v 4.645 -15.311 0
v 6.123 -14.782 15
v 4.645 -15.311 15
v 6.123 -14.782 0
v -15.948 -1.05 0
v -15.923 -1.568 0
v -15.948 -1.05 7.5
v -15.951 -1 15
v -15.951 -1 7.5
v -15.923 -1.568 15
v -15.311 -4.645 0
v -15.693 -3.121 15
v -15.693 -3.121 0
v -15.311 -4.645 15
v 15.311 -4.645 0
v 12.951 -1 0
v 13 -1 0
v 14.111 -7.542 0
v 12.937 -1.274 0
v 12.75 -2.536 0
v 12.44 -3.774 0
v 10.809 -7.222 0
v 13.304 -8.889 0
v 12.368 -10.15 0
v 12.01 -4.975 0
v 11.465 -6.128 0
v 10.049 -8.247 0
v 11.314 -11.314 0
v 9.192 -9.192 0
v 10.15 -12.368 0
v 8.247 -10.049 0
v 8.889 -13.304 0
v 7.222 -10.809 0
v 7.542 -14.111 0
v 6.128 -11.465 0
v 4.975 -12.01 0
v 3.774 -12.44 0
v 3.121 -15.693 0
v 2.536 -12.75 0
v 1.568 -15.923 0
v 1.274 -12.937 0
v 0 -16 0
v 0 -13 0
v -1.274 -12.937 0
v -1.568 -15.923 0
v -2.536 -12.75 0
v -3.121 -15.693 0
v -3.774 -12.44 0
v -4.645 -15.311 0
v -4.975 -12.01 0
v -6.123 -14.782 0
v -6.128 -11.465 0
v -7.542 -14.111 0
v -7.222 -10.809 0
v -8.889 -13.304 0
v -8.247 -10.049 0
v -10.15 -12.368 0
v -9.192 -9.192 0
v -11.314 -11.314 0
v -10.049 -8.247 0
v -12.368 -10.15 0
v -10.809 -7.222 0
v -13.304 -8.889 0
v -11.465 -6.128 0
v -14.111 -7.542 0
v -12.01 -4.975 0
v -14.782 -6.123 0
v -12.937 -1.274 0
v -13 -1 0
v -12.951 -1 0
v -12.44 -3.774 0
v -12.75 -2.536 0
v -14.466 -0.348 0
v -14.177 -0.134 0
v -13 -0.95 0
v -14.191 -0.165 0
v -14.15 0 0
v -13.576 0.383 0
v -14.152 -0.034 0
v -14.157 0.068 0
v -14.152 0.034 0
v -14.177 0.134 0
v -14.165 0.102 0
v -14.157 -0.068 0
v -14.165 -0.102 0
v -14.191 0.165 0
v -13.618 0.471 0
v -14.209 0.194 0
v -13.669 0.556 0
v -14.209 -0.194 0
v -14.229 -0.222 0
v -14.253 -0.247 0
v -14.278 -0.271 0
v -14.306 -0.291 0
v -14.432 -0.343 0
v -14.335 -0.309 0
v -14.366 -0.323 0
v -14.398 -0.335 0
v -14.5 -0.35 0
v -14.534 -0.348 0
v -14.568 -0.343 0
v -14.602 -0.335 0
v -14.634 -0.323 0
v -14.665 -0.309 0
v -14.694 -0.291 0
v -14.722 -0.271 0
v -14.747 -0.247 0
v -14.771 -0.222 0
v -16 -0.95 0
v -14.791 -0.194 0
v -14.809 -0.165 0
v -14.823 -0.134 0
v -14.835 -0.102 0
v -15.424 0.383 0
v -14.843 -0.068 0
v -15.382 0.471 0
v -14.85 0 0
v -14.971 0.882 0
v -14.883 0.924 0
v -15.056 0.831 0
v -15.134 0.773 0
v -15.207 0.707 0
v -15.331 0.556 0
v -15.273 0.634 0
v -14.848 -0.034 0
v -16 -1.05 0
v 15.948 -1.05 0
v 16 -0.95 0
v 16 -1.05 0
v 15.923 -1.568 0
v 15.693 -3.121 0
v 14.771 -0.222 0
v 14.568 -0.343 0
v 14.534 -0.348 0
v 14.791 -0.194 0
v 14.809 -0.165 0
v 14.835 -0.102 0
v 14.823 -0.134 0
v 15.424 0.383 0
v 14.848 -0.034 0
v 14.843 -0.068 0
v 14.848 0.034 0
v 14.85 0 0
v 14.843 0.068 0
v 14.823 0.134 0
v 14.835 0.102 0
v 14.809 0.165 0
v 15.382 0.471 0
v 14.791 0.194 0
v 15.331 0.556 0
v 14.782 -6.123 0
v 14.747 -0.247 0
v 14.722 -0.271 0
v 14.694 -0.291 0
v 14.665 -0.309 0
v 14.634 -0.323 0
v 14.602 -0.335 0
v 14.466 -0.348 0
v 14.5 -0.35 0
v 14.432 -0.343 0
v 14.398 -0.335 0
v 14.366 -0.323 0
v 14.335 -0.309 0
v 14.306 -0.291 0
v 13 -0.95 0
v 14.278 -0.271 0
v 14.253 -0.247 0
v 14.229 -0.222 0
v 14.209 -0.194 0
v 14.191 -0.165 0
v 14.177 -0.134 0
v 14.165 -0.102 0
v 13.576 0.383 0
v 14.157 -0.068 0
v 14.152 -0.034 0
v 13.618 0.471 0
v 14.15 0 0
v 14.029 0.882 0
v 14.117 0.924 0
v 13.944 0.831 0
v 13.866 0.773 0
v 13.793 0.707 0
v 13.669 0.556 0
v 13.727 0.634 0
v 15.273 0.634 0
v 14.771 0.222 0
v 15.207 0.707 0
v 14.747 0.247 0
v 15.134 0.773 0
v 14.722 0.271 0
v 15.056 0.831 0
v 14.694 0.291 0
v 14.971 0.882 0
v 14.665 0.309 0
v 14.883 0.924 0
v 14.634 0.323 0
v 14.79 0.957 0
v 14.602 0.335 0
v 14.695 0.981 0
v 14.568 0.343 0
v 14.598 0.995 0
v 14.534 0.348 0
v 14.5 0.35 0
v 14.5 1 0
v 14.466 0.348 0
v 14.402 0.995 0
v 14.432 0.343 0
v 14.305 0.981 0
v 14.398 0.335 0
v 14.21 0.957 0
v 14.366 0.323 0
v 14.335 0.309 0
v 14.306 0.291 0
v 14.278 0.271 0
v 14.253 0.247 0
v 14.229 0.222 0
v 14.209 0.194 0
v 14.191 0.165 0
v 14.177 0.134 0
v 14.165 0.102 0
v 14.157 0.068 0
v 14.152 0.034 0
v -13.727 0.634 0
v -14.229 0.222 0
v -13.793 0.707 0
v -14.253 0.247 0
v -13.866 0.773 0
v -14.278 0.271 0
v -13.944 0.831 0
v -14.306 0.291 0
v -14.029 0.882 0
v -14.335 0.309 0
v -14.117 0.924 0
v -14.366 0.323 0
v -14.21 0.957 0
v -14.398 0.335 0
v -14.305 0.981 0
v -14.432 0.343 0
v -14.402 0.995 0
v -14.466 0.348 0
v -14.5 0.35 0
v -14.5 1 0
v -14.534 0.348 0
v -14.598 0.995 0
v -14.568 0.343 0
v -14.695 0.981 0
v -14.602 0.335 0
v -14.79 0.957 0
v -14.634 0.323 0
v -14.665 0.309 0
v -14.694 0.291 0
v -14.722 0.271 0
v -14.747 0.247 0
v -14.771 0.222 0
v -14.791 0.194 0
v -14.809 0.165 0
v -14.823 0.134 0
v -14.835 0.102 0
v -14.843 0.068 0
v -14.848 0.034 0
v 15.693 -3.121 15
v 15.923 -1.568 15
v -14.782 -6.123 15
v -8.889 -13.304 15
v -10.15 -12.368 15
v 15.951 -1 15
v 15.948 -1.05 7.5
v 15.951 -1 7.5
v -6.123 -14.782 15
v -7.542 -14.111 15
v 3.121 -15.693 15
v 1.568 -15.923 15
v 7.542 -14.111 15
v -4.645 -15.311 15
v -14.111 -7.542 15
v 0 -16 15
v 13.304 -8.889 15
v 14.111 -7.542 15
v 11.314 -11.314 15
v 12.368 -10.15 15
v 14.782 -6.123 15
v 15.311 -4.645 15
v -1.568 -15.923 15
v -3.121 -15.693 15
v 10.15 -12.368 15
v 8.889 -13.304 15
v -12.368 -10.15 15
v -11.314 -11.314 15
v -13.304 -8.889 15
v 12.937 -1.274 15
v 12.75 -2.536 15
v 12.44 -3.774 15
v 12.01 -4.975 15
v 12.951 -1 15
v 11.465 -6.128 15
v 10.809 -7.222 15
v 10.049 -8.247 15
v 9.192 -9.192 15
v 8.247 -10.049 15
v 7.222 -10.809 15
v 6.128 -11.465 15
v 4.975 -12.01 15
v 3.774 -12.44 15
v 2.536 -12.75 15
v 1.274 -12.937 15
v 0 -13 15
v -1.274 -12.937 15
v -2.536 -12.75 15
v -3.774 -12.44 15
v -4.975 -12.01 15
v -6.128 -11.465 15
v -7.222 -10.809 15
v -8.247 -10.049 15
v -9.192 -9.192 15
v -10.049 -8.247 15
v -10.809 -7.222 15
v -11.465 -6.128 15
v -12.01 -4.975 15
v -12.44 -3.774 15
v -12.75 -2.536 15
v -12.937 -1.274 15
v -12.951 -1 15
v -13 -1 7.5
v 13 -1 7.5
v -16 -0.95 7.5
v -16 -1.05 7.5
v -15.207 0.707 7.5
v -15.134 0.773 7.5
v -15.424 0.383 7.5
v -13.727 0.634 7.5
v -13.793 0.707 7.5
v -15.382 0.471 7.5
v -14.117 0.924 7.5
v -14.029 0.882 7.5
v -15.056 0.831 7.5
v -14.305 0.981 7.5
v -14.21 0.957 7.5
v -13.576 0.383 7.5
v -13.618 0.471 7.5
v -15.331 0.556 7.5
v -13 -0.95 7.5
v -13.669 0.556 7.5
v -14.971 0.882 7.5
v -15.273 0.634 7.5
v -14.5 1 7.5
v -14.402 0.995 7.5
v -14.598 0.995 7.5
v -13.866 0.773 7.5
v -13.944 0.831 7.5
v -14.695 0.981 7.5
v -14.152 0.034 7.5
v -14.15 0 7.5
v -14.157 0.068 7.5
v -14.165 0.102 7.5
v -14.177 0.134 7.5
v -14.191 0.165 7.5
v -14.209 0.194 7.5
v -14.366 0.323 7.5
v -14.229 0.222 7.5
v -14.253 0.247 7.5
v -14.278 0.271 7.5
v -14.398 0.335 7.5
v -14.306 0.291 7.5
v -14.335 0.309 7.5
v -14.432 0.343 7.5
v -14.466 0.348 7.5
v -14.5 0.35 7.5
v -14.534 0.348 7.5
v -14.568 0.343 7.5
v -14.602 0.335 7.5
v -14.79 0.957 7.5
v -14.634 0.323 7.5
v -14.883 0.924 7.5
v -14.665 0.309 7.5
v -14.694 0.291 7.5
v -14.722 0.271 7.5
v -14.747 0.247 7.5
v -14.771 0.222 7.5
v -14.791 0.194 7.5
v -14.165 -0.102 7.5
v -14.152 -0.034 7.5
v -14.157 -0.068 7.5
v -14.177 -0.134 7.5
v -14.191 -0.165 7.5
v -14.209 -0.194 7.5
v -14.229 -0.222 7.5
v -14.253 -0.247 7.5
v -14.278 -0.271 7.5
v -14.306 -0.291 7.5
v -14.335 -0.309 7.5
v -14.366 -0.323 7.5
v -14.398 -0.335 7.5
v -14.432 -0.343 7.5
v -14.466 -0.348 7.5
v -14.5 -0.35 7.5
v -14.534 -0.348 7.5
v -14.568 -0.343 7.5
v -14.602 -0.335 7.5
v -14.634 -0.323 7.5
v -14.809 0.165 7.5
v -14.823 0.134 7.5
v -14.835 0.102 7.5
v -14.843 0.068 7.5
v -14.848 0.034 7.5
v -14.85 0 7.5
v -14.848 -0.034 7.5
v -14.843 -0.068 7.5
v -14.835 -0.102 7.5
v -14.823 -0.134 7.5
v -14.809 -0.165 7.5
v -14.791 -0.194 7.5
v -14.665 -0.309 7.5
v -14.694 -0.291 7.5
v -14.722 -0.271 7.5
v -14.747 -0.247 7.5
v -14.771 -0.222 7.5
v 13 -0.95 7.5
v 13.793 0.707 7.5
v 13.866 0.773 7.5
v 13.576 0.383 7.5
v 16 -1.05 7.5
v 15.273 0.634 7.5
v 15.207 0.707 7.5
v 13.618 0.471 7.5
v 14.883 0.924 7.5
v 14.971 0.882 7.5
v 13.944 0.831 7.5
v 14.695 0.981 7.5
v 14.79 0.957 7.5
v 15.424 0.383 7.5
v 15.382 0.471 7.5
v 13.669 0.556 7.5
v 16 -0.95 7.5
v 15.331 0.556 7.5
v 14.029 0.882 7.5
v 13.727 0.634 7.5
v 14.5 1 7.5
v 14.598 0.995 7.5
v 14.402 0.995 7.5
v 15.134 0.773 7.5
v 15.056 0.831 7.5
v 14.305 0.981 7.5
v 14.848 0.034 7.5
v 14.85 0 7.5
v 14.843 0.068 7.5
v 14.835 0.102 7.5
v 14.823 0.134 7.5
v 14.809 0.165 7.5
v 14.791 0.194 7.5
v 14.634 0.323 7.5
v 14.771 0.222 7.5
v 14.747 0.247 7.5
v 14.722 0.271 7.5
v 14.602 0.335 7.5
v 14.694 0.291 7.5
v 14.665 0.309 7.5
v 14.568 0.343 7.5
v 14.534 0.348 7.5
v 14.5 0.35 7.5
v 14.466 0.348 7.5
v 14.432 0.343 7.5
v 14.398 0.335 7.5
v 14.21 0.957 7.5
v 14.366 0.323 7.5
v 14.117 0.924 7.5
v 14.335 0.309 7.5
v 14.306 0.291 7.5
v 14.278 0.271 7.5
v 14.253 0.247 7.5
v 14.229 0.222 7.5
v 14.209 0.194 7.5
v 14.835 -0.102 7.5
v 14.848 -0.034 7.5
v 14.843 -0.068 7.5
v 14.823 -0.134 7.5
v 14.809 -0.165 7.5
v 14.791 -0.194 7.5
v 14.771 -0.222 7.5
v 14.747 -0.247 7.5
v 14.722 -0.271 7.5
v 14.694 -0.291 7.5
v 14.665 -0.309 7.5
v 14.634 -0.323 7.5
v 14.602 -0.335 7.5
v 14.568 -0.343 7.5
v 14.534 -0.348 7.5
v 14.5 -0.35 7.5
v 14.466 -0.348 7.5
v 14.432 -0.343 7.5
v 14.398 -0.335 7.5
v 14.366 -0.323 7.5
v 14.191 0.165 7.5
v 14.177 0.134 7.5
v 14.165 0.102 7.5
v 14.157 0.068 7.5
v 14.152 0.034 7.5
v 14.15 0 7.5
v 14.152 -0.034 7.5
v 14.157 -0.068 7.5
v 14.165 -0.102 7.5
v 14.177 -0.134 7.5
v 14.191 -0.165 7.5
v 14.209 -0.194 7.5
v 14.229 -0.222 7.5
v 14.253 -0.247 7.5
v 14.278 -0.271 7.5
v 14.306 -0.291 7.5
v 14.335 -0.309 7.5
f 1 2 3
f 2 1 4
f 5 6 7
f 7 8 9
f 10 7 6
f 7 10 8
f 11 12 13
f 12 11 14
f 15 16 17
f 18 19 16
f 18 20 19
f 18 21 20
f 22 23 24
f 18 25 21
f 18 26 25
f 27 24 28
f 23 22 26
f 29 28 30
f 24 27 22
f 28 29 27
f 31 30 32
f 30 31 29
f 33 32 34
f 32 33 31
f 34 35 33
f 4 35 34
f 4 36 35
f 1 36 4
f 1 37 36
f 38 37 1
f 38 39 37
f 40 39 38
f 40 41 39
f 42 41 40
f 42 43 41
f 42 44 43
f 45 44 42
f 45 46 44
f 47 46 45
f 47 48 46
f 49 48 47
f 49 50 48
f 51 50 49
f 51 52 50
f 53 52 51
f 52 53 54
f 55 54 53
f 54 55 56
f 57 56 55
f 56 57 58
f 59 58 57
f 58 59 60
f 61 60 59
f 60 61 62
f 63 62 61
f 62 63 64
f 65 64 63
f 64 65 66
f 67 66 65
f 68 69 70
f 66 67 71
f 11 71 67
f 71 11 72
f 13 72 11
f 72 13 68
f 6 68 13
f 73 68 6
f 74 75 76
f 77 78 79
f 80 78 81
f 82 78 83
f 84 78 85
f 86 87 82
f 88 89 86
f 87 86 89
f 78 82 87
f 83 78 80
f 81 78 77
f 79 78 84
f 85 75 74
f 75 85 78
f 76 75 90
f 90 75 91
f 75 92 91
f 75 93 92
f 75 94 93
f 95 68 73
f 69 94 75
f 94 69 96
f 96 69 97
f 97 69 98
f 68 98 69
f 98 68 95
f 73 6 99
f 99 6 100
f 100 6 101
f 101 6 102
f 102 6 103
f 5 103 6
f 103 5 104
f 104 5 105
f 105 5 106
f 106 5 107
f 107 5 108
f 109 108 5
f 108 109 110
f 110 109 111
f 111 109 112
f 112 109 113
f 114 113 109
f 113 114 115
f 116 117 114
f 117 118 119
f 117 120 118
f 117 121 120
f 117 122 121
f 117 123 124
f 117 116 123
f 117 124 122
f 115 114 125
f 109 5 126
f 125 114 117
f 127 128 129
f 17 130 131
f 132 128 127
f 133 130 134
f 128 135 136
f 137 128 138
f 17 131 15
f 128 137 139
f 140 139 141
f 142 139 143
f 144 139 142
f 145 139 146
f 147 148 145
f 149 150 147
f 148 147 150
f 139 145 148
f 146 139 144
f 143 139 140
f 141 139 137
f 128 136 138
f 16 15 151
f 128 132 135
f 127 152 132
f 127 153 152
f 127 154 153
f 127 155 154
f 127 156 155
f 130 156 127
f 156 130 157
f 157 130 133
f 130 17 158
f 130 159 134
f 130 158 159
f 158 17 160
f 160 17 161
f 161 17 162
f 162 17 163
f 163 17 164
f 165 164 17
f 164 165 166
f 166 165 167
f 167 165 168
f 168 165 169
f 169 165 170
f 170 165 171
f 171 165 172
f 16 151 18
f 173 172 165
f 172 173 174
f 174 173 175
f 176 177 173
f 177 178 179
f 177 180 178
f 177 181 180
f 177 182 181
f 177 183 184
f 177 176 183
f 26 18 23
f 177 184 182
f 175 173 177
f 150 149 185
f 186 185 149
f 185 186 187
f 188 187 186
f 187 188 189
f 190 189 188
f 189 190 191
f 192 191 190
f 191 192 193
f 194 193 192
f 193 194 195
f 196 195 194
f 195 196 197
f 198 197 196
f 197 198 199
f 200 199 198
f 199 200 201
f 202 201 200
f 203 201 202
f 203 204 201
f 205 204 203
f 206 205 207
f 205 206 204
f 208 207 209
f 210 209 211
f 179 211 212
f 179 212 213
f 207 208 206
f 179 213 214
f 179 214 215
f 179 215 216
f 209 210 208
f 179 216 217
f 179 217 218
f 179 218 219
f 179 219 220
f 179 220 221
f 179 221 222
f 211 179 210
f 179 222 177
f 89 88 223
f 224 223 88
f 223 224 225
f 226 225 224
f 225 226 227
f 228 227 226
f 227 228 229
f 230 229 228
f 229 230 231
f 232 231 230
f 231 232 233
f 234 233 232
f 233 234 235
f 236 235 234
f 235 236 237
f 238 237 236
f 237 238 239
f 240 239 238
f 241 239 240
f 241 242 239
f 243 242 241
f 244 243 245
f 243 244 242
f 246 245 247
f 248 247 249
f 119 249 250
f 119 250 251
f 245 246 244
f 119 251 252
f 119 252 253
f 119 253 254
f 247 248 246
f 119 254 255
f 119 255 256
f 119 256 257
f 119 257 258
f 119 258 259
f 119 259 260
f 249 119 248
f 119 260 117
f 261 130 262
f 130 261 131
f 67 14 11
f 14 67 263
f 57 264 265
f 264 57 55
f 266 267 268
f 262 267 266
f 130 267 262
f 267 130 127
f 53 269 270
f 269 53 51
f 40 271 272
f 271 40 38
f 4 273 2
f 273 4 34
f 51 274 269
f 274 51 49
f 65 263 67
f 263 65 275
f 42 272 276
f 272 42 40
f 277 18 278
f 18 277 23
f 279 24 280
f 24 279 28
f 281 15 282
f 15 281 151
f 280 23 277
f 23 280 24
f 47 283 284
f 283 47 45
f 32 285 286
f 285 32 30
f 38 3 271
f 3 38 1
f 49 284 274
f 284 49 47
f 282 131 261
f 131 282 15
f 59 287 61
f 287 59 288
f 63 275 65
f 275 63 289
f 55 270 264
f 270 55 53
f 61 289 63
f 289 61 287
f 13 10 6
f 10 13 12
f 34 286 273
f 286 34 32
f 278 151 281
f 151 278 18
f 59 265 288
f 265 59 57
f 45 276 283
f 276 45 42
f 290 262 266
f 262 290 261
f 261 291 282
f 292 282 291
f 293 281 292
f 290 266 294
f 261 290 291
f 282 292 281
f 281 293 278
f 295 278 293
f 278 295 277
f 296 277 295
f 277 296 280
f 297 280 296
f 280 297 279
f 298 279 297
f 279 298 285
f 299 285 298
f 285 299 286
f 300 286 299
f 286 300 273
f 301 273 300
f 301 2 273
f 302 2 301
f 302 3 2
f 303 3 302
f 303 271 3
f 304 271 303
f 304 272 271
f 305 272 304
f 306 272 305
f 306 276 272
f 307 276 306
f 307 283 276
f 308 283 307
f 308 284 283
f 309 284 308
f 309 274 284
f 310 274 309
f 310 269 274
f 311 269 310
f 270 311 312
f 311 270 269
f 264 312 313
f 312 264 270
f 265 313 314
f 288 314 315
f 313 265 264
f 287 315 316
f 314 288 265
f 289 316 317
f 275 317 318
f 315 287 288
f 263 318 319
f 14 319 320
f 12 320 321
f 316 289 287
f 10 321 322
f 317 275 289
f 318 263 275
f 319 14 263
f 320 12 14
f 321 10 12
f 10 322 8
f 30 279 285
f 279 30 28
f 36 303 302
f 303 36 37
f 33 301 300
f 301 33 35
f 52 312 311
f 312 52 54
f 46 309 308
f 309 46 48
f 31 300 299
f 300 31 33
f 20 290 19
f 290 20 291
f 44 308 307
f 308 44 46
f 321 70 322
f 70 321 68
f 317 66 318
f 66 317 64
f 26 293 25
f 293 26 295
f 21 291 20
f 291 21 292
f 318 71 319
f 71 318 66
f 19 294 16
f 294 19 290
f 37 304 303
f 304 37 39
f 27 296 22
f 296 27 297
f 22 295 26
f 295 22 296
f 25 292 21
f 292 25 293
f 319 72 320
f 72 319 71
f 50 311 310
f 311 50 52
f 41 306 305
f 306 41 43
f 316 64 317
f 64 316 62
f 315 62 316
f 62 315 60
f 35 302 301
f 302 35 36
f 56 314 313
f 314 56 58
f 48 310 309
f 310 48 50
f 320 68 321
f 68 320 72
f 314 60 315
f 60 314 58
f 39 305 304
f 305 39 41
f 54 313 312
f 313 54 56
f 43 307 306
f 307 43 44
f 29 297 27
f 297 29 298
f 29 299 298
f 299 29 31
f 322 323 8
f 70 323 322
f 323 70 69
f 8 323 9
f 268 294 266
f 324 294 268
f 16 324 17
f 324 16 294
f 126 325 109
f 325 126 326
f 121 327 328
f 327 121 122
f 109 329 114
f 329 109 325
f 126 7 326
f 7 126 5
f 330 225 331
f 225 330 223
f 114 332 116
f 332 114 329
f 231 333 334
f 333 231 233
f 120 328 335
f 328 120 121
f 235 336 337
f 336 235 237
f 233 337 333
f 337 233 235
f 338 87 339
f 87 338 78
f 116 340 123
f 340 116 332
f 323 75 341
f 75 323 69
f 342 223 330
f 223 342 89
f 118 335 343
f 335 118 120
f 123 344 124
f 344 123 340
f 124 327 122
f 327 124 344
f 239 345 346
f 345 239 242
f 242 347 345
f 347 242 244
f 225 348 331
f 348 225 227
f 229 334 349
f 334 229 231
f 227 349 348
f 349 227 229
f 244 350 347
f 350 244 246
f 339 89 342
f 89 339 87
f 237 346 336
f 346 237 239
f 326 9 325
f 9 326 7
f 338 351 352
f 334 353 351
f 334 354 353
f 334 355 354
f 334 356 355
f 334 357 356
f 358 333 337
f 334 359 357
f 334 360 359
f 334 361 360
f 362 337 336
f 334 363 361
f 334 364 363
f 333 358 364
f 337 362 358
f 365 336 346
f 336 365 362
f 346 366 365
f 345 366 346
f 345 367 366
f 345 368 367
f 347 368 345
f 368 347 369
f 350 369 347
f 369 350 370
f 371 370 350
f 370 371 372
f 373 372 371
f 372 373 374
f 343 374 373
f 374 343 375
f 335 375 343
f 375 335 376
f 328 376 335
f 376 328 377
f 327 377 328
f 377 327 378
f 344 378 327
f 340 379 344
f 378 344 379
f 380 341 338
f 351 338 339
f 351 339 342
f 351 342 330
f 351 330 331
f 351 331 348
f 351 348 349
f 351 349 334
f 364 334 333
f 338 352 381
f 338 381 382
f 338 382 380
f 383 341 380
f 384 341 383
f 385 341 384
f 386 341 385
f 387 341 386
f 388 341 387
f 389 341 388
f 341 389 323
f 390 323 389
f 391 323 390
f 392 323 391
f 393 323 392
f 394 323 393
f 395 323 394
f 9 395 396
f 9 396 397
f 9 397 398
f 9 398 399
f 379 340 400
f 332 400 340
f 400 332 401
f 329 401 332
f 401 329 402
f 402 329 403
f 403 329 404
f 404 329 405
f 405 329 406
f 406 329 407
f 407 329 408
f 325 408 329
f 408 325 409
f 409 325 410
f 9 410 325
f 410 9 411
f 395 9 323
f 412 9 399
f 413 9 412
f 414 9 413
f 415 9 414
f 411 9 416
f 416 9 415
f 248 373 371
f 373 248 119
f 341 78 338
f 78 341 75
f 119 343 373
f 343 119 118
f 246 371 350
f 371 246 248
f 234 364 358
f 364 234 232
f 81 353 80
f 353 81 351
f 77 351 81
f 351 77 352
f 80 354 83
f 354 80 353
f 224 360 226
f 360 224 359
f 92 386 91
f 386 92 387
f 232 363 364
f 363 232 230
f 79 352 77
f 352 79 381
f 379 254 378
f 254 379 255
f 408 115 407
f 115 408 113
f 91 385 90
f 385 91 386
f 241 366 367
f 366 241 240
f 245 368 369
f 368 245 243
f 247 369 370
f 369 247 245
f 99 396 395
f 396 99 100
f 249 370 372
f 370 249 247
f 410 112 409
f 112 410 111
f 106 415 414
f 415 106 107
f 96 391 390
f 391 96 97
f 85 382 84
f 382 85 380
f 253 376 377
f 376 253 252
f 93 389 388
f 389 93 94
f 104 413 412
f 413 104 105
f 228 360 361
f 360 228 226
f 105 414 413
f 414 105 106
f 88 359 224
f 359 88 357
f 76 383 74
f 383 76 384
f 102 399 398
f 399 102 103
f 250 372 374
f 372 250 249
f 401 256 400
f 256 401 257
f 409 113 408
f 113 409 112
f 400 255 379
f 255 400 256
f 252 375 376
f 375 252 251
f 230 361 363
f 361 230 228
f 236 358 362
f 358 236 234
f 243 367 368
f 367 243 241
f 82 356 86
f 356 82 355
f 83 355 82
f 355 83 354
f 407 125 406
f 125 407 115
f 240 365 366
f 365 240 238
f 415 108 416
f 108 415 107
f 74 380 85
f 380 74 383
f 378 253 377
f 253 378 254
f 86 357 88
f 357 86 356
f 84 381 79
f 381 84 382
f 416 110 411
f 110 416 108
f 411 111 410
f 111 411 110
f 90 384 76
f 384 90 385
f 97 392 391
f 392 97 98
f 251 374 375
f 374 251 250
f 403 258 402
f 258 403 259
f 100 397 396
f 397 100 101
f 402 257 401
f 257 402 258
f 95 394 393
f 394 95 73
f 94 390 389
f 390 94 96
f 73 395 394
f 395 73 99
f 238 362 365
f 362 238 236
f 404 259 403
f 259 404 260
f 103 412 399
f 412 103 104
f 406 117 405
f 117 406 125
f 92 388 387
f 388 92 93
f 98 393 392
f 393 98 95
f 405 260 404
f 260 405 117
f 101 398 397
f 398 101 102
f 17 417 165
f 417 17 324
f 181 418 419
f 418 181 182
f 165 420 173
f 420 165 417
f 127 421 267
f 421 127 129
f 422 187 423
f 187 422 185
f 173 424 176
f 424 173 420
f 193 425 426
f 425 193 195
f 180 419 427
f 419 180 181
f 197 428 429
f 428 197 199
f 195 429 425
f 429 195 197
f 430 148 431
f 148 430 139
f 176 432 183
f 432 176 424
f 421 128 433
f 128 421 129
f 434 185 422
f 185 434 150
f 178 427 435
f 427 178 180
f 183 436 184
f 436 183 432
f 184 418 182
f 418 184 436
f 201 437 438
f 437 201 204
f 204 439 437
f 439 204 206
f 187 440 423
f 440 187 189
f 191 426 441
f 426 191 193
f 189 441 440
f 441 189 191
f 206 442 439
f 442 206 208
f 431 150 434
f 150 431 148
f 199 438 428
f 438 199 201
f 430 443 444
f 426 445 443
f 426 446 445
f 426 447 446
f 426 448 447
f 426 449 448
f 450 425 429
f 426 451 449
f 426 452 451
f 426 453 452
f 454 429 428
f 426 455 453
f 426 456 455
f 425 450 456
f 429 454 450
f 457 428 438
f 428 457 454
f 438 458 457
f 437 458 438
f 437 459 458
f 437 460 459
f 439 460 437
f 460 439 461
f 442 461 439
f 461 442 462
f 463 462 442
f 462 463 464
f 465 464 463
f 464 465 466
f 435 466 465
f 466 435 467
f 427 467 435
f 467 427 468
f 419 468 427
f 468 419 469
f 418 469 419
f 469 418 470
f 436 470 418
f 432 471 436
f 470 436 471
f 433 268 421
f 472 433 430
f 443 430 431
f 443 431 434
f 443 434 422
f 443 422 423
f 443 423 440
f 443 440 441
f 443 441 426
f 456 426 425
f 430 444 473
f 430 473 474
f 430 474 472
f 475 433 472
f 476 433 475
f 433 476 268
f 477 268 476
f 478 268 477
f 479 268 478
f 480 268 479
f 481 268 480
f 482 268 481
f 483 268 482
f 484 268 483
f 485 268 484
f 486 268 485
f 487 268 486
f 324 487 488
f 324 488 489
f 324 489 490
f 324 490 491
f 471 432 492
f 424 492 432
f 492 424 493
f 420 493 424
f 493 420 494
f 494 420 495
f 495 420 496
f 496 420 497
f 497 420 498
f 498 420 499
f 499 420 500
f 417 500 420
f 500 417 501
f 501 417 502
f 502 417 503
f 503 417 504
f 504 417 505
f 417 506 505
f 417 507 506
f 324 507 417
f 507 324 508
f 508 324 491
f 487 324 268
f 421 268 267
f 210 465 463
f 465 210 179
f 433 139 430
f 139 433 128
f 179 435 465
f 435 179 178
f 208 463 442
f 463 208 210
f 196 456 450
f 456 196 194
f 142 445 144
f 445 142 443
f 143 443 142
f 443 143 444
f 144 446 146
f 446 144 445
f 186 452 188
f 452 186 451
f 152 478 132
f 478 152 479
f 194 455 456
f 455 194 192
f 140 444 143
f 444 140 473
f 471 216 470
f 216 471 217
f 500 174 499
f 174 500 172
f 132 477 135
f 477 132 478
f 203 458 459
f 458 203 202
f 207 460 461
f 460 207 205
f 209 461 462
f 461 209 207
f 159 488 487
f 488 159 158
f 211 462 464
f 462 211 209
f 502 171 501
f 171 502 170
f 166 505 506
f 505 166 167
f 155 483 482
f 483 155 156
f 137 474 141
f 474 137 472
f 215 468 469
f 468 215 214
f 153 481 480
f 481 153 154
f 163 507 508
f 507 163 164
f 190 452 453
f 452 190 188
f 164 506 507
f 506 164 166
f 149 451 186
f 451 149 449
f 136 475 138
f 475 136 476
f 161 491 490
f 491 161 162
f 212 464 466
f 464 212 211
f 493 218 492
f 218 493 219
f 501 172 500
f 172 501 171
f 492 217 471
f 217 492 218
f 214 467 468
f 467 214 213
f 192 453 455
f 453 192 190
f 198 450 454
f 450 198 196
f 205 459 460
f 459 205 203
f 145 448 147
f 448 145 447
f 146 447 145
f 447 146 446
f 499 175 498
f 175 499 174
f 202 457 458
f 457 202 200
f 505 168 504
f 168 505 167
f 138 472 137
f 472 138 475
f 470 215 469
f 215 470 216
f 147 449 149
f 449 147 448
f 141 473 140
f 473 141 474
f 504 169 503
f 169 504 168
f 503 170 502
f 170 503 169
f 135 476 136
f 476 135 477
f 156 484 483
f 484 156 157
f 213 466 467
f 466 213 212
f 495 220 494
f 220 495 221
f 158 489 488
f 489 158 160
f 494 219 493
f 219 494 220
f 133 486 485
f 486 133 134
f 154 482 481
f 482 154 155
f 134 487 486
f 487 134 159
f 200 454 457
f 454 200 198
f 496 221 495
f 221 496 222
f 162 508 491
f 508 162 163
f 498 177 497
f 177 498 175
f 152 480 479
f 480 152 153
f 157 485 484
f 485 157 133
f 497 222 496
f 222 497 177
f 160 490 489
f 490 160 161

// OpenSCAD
H=15;

D0=26;
D1=32;
O=2;
$fn=64;


module half() {

    union() {
        translate([0,0,H/2])
        difference(){
            cylinder(d=D1,h=H,center=true);
            cylinder(d=D0,h=H+1,center=true);
            translate([-D1,-O/2,-D1])
            cube(2*D1);
        }
        
        
        DI=D1-D0;
        RX=(D0+D1)/2/2;
        for(x=[-RX,RX]){
            translate([x,0,H/4]) {
                difference(){
                    hull(){
                        cylinder(d=O,h=H/2,center=true);
                        translate([0,-O/2,0])
                        cube([DI/2,0.1,H/2],center=true);
                    }
                    cylinder(d=.7,h=H,center=true);
                }
            }
        }
    }

}

half();
